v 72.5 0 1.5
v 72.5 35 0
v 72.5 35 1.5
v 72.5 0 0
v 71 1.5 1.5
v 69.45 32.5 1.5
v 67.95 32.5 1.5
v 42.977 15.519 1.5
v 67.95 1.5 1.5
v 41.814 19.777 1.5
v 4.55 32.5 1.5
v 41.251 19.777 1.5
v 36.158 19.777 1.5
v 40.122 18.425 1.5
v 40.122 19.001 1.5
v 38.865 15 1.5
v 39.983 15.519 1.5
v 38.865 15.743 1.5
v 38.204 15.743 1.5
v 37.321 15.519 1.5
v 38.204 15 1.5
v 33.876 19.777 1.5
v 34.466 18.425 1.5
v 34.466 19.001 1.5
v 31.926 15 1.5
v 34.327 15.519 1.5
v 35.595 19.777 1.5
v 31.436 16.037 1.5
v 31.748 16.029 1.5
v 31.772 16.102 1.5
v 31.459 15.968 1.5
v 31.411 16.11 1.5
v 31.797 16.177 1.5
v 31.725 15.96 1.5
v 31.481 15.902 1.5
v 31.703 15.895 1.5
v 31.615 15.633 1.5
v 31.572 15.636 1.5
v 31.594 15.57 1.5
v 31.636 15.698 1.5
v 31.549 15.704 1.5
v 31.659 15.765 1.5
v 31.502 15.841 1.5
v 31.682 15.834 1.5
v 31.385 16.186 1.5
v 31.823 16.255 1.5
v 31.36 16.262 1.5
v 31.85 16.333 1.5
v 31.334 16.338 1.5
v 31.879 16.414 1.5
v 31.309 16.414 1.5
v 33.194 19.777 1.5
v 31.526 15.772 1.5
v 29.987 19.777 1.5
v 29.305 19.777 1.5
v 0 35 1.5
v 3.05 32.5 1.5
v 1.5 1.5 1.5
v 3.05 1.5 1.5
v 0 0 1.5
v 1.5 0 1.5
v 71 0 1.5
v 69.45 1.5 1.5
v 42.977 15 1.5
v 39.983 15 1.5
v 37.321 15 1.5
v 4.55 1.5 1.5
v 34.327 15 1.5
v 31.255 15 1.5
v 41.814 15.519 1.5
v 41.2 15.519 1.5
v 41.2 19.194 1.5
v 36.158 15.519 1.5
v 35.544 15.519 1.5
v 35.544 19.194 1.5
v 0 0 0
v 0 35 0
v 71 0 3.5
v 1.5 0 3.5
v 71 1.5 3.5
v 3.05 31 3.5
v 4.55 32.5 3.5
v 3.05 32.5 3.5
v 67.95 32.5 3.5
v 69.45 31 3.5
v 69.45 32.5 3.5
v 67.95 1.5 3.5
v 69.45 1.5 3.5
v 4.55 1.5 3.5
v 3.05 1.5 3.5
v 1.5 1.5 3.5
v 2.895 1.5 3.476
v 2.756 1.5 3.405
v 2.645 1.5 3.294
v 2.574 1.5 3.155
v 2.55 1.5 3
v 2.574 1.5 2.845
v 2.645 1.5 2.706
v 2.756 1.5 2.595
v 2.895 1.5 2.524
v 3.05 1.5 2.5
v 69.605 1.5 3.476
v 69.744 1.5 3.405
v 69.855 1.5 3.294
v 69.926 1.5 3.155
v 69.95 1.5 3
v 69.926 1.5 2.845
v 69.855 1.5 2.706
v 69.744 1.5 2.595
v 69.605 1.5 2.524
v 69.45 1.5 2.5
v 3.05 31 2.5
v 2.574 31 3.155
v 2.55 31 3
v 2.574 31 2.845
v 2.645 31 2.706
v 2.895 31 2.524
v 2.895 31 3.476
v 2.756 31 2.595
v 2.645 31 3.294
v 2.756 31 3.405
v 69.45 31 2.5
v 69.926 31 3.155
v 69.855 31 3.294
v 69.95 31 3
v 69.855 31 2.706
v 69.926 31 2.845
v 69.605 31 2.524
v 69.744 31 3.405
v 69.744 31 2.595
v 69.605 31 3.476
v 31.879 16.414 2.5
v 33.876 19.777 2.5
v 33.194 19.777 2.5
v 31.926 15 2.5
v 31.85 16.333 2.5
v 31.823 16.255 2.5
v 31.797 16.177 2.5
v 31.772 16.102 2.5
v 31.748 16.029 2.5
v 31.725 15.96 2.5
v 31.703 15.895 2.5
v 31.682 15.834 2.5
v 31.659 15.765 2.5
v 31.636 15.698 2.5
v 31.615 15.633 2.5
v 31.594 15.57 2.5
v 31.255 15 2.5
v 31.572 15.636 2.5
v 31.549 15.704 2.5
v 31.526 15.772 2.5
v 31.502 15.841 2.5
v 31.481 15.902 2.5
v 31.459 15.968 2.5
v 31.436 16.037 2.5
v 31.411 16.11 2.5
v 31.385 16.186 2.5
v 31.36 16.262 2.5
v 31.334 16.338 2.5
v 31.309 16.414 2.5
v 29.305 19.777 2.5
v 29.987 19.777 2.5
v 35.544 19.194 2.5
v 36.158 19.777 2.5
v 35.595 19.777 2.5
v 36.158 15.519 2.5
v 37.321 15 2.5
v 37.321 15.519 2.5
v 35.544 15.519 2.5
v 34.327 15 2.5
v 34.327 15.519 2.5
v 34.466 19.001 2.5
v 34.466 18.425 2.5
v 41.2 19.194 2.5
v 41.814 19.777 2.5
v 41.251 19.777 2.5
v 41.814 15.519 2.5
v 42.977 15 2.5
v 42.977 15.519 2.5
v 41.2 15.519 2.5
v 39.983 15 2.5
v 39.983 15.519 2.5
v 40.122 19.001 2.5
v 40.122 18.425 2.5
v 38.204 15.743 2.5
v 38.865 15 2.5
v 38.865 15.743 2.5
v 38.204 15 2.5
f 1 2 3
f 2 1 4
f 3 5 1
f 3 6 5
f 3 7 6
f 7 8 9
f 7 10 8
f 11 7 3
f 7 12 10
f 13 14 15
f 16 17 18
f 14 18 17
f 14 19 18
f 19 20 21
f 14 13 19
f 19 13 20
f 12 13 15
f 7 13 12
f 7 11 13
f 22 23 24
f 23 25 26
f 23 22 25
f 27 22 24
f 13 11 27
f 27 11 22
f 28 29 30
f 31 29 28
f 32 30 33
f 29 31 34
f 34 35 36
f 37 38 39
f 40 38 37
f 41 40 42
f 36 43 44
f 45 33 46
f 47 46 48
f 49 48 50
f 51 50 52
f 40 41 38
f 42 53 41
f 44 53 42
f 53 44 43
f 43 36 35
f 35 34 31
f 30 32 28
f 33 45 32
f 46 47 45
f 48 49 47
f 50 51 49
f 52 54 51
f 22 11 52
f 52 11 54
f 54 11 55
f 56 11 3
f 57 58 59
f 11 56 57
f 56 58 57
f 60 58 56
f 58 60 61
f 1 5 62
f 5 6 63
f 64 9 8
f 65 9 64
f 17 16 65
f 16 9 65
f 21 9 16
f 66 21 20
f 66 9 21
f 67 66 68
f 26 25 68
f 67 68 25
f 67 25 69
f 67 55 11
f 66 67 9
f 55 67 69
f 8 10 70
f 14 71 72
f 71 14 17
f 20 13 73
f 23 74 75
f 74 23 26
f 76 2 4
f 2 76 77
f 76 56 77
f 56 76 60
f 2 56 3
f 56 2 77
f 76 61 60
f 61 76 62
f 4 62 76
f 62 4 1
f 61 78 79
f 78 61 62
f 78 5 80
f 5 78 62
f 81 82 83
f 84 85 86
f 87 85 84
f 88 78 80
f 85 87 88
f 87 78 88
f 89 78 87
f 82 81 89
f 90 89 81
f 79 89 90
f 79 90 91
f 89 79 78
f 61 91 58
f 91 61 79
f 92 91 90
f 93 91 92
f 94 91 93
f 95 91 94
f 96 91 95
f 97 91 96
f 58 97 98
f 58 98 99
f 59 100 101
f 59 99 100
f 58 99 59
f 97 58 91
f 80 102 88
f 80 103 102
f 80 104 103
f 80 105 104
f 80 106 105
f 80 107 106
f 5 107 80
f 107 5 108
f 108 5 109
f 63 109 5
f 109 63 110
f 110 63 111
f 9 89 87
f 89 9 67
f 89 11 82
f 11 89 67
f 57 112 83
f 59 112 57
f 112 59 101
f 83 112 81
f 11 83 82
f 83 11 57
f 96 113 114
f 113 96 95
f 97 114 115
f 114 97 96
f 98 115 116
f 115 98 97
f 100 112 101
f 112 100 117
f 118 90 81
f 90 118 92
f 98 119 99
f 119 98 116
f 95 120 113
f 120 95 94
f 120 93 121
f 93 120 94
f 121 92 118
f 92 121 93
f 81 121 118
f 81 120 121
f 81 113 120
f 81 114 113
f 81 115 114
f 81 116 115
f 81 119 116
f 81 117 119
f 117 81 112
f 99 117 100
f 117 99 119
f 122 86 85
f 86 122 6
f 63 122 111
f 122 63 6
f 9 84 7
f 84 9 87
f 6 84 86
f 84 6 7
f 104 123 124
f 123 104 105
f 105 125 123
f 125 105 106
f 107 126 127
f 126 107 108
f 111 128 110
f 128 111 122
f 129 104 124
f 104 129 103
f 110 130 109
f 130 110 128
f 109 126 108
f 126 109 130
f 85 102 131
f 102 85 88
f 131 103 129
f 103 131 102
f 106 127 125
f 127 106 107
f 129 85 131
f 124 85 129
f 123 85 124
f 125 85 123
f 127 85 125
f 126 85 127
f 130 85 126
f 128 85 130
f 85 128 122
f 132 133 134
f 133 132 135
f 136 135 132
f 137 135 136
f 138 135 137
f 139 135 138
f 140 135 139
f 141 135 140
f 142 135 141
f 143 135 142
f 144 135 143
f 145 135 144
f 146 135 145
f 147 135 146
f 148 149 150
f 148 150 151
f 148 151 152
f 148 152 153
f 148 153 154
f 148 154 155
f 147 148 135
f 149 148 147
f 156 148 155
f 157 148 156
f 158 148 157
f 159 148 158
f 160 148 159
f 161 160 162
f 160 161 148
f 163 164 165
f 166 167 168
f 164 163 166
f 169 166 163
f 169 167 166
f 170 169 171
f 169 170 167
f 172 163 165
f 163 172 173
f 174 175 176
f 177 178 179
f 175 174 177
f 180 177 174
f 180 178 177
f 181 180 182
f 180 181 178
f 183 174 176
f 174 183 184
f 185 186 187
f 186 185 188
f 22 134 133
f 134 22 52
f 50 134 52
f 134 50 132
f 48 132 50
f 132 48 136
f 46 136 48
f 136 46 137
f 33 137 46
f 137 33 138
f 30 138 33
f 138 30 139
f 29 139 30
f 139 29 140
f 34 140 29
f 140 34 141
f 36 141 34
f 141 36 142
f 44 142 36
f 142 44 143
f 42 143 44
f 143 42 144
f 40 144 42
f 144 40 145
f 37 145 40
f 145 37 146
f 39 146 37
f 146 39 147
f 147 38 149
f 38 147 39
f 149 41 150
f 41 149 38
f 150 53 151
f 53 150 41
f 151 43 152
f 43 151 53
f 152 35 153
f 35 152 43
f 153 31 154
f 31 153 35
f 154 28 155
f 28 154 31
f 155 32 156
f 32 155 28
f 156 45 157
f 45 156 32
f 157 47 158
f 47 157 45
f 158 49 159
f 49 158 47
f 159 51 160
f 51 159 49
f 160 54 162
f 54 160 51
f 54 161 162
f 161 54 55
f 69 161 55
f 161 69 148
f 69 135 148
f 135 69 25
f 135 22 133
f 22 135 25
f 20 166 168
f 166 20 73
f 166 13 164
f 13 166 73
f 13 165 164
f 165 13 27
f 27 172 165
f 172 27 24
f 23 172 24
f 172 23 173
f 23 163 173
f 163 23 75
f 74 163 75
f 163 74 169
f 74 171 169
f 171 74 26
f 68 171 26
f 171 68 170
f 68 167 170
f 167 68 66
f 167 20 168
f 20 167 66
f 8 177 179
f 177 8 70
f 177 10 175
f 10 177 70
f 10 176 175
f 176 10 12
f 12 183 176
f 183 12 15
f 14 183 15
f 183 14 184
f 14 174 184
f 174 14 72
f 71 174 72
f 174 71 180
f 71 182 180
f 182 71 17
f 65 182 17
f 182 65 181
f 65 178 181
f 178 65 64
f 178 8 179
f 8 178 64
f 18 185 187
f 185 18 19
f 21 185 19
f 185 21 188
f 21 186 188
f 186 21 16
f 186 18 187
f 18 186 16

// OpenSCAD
//
//	Gerause für REM-C  / Din rail
//
//  by Rainer Petzoldt
//  basiert auf REM-M-Geh.scad V0.3.7
//  Slicen ohne Stützstruktur ;  4 Wandlinien ;  3 Obere- und untere Schichten
//     generateStuetzstruktur = true setzen

/* width in TE (=18mm) */
AnzTE = 4;   // [1:0.5:12]
/* select which part to show */
part = "Deckel" ; // [Unterteil, Oberteil, Deckel, Oberteil_mit_Deckel, Schnapper, all, assembled]
showPlatinen = false;
generateStuetzstruktur = true;

// *******************************************************************

/* [Hidden] */
deckelLift = 1*5;   // zieht module auseinander (Explosionszeichnung)
h1debug =  0*19;   // 0 = no debug  erniedrigt aussenwand um h1debug mm
Vers =  "V1.1";
TE = 18;	// Teilungseinheit
d = 1.5;   				// Wanddicke

breite = AnzTE * TE-0.5+1;  // Gesamtbreite aussen
tiefe = 91;				// Tiefe unterste Ebene
tiefe2 = 62-12;			// Tiefe mittlere Ebene
tiefe3 = 45-10;			// Tiefe mittlere Ebene

deltaH = 0*12;
h1 = 26.5+deltaH;				// Hoehe Unterteil gesamt aussen
h2 = 5;           // Aussparung fuer Schiene 
h3 = 5;         // Hoehe unterste Deckelschicht
h4 = 17-deltaH;          // Hoehe mittlere Deckelschicht
h5 = 22-10;          // Hoehe obere Deckelschicht
b1 = 28-2.5;
b2 = 0.5;
b3 = 35;
b4 = 28;
spalt = 0.4;

mitteY = tiefe / 2;
mitteX = breite/2;

RemMMy = 42;
RemMMx = 33;
RemMMAbstandy = 0;

F5 = 0.001;


difference()
{
	union()
	{
if (part=="assembled")
{
		Unterteil(breite);
		translate([0,0,h1+deckelLift])	Oberteil(breite);
		translate([0,(tiefe+tiefe3)/2,h1+h3+h4+h5+2*deckelLift])rotate([180,0,0])Deckel(breite);
		color("red") translate([breite/2-14/2,b1+1.5,5]) rotate([-90,0,-90])Schienenhalter();
		if (showPlatinen==true)
		{	
			translate([d-31.5+1,d-100+0.5,9])	color("White") 	rotate([0,0,90])	import("REM-C-mit_Sockel_u_Stecker.stl",convexity=5);
		}
}
else
{
	if (part=="Unterteil")
	{
		Unterteil(breite);
		if (showPlatinen==true)
		{	
			translate([d-31.5+1,d-100+0.5,9])	color("White") 	rotate([0,0,90])	import("REM-C-mit_Sockel_u_Stecker.stl",convexity=5);
		}

	}
	if (part=="Oberteil")
	{
		Oberteil(breite);
		if (showPlatinen==true)
		{	
			translate([d-31.5+1,d-100+0.5,9-h1])	color("White") 	rotate([0,0,90])	import("REM-C-mit_Sockel_u_Stecker.stl",convexity=5);
		}
	}
	if (part=="Oberteil_mit_Deckel")
	{
		color("red")translate([0,(tiefe+tiefe3)/2+F5,h3+h4+h5+deckelLift])rotate([180,0,0])Deckel(breite);
		Oberteil(breite);
		if (showPlatinen==true)
		{	
			translate([d-31.5+1,d-100+0.5,9-h1])	color("White") 	rotate([0,0,90])	import("REM-C-mit_Sockel_u_Stecker.stl",convexity=5);
		}
	}
	if (part=="Deckel")
	{
			Deckel(breite);
	}
	if (part=="Schnapper")	rotate([-90,0,0])Schienenhalter();
	if (part=="all")
	{
		Unterteil(breite);
		translate([breite+10,0,5]) Oberteil(breite);
		translate([2*breite+20,0,0])Deckel(breite);
    translate([2*breite+20,50,3])rotate([-90,0,0])Schienenhalter();
		
		if (showPlatinen==true)
		{	
			translate([d-31.5+1,d-100+0.5,9])	color("White") 	rotate([0,0,90])	import("REM-C-mit_Sockel_u_Stecker.stl",convexity=5);
			translate([d-31.5+1+breite+10,d-100+0.5,9-h1+5])	color("White") 	rotate([0,0,90])	import("REM-C-mit_Sockel_u_Stecker.stl",convexity=5);
		}
	}
}
}
	//translate([33,-25,-17])cube([100,200,100]);
}


module Deckel(breite)
{
	da = d + 0.5;
	cube([breite,tiefe3,d]);	 // Deckel
	translate([d,0,0])cube([breite-2*d,d,d+2]);	 // Seitenwand
  // rechtes
	dx = 0.1;
	translate([2*d +dx/2  ,d,0])cube([d,tiefe3-2*da,d+2]);	  // rechts
  translate([2*d +dx/2  ,tiefe3-2*da,3])rotate([90,0,0])cylinder(h=tiefe3-2*da,d=1,$fn=20); // rechts 
	// links
	translate([breite-3*d-dx/2,d,0])cube([d,tiefe3-2*da,d+2]);	
  translate([breite -2*d-dx/2 ,tiefe3-2*da,3])rotate([90,0,0])cylinder(h=tiefe3-2*da,d=1,$fn=20);

  translate([mitteX,15,1])scale(0.5)linear_extrude(height=3)text(Vers,halign="center");

}  

module Deckelschienen()
{
	dy = 32.5;
	translate([0,29+dy,32.5])
	rotate([90,0,0])
	linear_extrude(height=dy,convexity=2)
	polygon(points = [ [0,0], [2*d,0],[2*d,-3],[0,-8] ], convexity = 2);
}

module Unterteil(breite)
{
	difference()
	{
		//translate([-d-0.001,0,118])  // debugging
		cube([breite,tiefe,h1-h1debug]);																				// Aussenwand
		translate([d,d,h2+d+F5])cube([breite-2*d,tiefe-2*d,h1-d-h2]);		// Innenwand
    // Kabelzufuehrungen
		translate([61,75,7+h2+d+F5])cube([3,15.599,5]);		//  3.3V   mit einer Schicht verschlossen da optional
		translate([61+2*2.54,75,7+h2+d+F5])cube([3,15.599,5]);		// 3.3V mit einer Schicht verschlossen da optional
		for (i=[2*5.08:5.08:7*5.08])
		{
			translate([40.7-2*5.08+i,-5,7+h2+d+F5])cube([3,20,5]);		//  Spannungsanschluss
		}
		for (i=[0:5.08:1*5.08])
		{
			translate([40.7-2*5.08+i,0.401,7+h2+d+F5])cube([3,20,5]);		//  Spannungsanschluss Optional
		}
		for (i=[0:5.08:1*5.08])
		{
			translate([6.5+i,-5,7+h2+d+F5])cube([3,20,5]);		//  Spannungsanschluss
		}
		
		
		translate([35.5,75,22.5])cube([17,20,14]);		// Ausschnitt für RJ45
		translate([9.5,85,20.5])uUSB();		// Ausschnitt für USB
		
		translate([0,b1,0])Railausschnitt(breite+1);										// Schienenausschnitt
		translate([breite/2-14/2-spalt,0-F5,2-2*spalt-F5])cube([14+2*spalt,b1+2*d+F5,3+2*spalt]);		// Schnapperausschnitt
  	translate([breite/2-3.5,10,0])		cylinder(h=8,d=3.0,$fn=20);   // Loch fuer Schnapperverankerung
		wa = 3;  // Wanddicke Aussparungen
		translate([breite/2-10/2,0-F5,d-4.9+2*F5])cube([10,13,h2]);		      // Wartungsoeffnung
		translate([wa,wa,-F5])cube([(breite-14)/2-2*wa,b1-2*wa,h2]);	    // Materialsparen unten1
		translate([(breite+14)/2+wa,wa,-F5])cube([(breite-14)/2-2*wa,b1-2*wa,h2]);	    // Materialsparen unten2
		translate([wa,tiefe-b4+wa,-F5])cube([breite-2*wa,b1-2*wa,h2]);		// Materialsparen unten3
		translate([(breite-14)/2+1.5,0,1.6+d])rotate([60,0,0])translate([0,0,-3])cube([4,3,7]);		// Rampe fuer Schnappernase
		translate([(breite-14)/2+5.5-F5,-1,1.6+d])rotate([20,0,0])translate([0,0,-0])cube([4,3,7]);		// Rampe fuer Schraubendreher
		// Schnapperaussparungen
		Schnapperaussparungen(10,h1-26.5+22);
		
	}
	  // Logo und Version
    translate([mitteX,tiefe-12,h2+d-0.4])scale(0.5)RPLogo();
 	  translate([mitteX,tiefe-27,h2+d-0.8])scale(0.5)linear_extrude(height=3)text(Vers,halign="center");

	// Platinenhalterungen
	phx = (RemMMx)/2 + 6;// breite/2 - d -2.25-0.5;	// Mittenabstand Platinenhalter x
	phy = tiefe/2-d-2-8;
	phy2 = RemMMAbstandy/2+2.6;


	echo("Unterteilloecher:", 2phx=2*phx, 2phy=2*phy, 2phy2=2*phy2, dpy=phy-phy2);
	// Abstandsbolzen
	//Bolzenpositionen festlegen
	translate([mitteX+phx,mitteY+phy,0]) Platinenhalter(2,0);
	translate([mitteX-phx,mitteY+phy,0]) Platinenhalter(2,0);
	translate([mitteX+phx,mitteY-phy,0]) Platinenhalter(2,0);
	translate([mitteX-phx,mitteY-phy,0]) Platinenhalter(2,0);
	// Schraublochbolzen
	translate([6.5,25,0]) Platinenhalter(5);
	translate([66.5,58,0]) Platinenhalter(5);
	// Haltekante nach oben
	hky = 3.75;
	
	if ( generateStuetzstruktur)
	{ 
		di = 0.41;
		color("blue")
		{	// Fuer Schnapperlement
			hull()
			{
				translate([29,0,4-0.21])cube([12,13,1]);	
				translate([33,1,0])cube([8,9,1]);	
			}
		// Fuer Bodenhohlräümen	
		translate([4,9,-0.10])cube([21,di,5-0.21]);		// z -0.1 wegen bug in Cura
		translate([4,15,0])cube([21,di,5-0.21]);		
		translate([14,4,0])cube([di,17,5-0.21]);		// quer

		translate([47,9,0])cube([21,di,5-0.21]);		
		translate([47,15,0])cube([21,di,5-0.21]);		
		translate([57,4,0])cube([di,17,5-0.21]);		// quer

		translate([28,26,0])cube([16,di,5-0.21]);		
		translate([0,36,0])cube([breite,di,5-0.21]);		
		translate([0,47,0])cube([breite,di,5-0.21]);		
		translate([breite/4,27,0])cube([di,29,5-0.21]);		// quer
		translate([2*breite/4,26,0])cube([di,29,5-0.21]);		// quer
		translate([3*breite/4,27,0])cube([di,29,5-0.21]);		// quer

		translate([4,70,0])cube([breite-8,di,5-0.21]);		
		translate([4,80,0])cube([breite-8,di,5-0.21]);		
		translate([breite/4,67,0])cube([di,18,5-0.21]);		// quer
		translate([2*breite/4,67,0])cube([di,18,5-0.21]);		// quer
		translate([3*breite/4,67,0])cube([di,18,5-0.21]);		// quer
		}
	}
}


module Schnapperaussparungen(schnapperbreite,h=22)
{
		at = 2;  	// tiefe Aussparung
		ah = 2;   	// Hoehe Aussparung
		ab = schnapperbreite;  		// Breite Aussparung
		//h = 22;	// Position Z
	  yd = 10;
	  y1 =  mitteY - yd;
    y2 =  mitteY + yd;

		translate([       0,y1  , h]) rotate([0,0,-90]) Schnapperaussparung(ab,at,ah);
		translate([  breite,y1, h]) rotate([0,0, 90]) Schnapperaussparung(ab,at,ah);
		translate([       0,y2  , h]) rotate([0,0,-90]) Schnapperaussparung(ab,at,ah);
		translate([  breite,y2, h]) rotate([0,0, 90]) Schnapperaussparung(ab,at,ah);
}

module Schnapperaussparung(ab,at,ah)
{
	translate([-ab/2,-F5,0])cube([ab,at,ah]);
	translate([-ab/2,1,1])cube([ab,at,5]);
}

module Railausschnitt(breite)
{
	difference()
	{
		
		translate([breite+0.5,0,h2-F5])		rotate([-90,0,90])
		linear_extrude(height=breite+1,convexity=2)
		{
			polygon(points=[[b2,0],[0,h2],[b2+b3,h2],[b2+b3,0]]);
		}
		
		translate([-0.5,b2+b3-2.5,3.5])rotate([0,90,0])
	
	  hull()
		{
        translate([1.8,0,0]) cylinder(h=breite+1, r=1, $fs=0.1, center=false);
        translate([0,1.8,0]) cube([2.8,1,breite+1], center=false);
        translate([3,0,0]) cube([1,3,breite+1], center=false);
    }
	}
}

module Schienenhalter()
{
	
	l1 = 30.4;
	l2 = 1.2;
	l3 = l1 + l2;
	h1 = 1.2;
	h2 = 1.8;
	h3 = h1 + h2;
	ba = 14;

	difference()
	{
		// Grundform
		linear_extrude(height=ba,convexity=2)
		{
			polygon(points=[[-0.5,h1],[l2,h3],[l3,h3],[l3,0],[l2,0],[l2,h1]]);
		}
		// Federelement
    translate([14,h3+F5,2])
		rotate([90,0,0])
		linear_extrude(height=h3+2*F5,convexity=2)
		{
			ha = 10.5;
			bx = 8;
			v = 1;
			polygon(points=[
			[0,0],[0,ha],[3-v,ha],[3,ha-v],[3,1.5],[5,1.5],[5,ha-v],[5+v,ha],
			[bx,ha],[bx,0]
			]);
		}
		translate([16,-2,3.5])cube([4,h3,9]);			        // Feder duenner machen
		translate([l3-3-2,0-F5,3])cube([3,h3+2*F5,8]);			// Aussparung zum oeffnen mit Schraubendreher
	}
	translate([18,h3,3.5])	rotate([90,0,0])	cylinder(h=h3+d,d=2,$fn=20);	// Arretierung
}

module Platinenhalter(durchmesser=4, loch=2)
{
	translate([0,0,h2+d])
	difference()
	{
		cylinder(h=2.5,d1=durchmesser+3,d2=durchmesser,$fn=20);
		translate([0,0,-F5])cylinder(h=2.6,d=loch,$fn=20);
	}
}




module uUSB()
{
	rad = 1;
	rad2 = 1.5;
	fn = 20;
	h = 8;
	dx = 1.;
	
	//translate([0,-1.5,0])cube([10,7,5]);
	hull()
	rotate([-90,0,0])
	{
		translate([dx+rad,-rad,0]) cylinder(h=h,r=rad,$fn=fn);
		translate([10-dx-rad,-rad,0]) cylinder(h=h,r=rad,$fn=fn);
		translate([rad2,rad2-5,0]) cylinder(h=h,r=rad2,$fn=fn);
		translate([10-rad2,-5+rad2,0]) cylinder(h=h,r=rad2,$fn=fn);
	
	}
	
}


module Oberteil(breite)
{
	difference()
	{
		union()
		{
			cube([breite,tiefe,h3]);																				// Aussenwand unten
			translate([0,(tiefe-tiefe2)/2,h3]) cube([breite,tiefe2,h4]);		// Aussenwand mitte
			translate([0,(tiefe-tiefe3)/2,h3+h4]) cube([breite,tiefe3,h5-d]);		// Aussenwand oben
			translate([30.5,70,h3]) cube([27,21,12]);		// RJ45 Auswoelbung
			// Beschriftungen
				translate([11,       11.5+F5,h3])	scale(0.5)linear_extrude(height=0.6/0.3,convexity=2)text(text="5V",halign="center",font="Arial:style=Bold");
				translate([10,       0.5+F5,h3])	scale(0.5)linear_extrude(height=0.6/0.3,convexity=2)text(text="+  -",halign="center",font="Arial:style=Bold");
				translate([32.95,       11.5+F5,h3])	scale(0.5)linear_extrude(height=0.6/0.3,convexity=2)text(text="U  L1 L2 L3",font="Arial:style=Bold");
				translate([65,       75+F5,h3])	scale(0.5)linear_extrude(height=0.6/0.3,convexity=2)text(text="3.3V",halign="center",font="Arial:style=Bold");
				translate([65,       86.5+F5,h3])	scale(0.5)linear_extrude(height=0.6/0.3,convexity=2)text(text="+  -",halign="center",font="Arial:style=Bold");
			
/*
			// Lochbeschriftung
			for(i=[0:AnzTE*3-0.1])
			{
				start = breite/2-(AnzTE*3-1)*5.08/2-0.75;
				num = i+1;
				translate([start+i*5.08,       11.5+F5,h3])	scale(0.5)linear_extrude(height=0.6/0.3,convexity=2)text(text=str(num),halign="center",font="Arial:style=Bold");
				translate([start+i*5.08, tiefe-16.2+F5,h3])	scale(0.5)linear_extrude(height=0.6/0.3,convexity=2)text(str(6-i),halign="center",font="Arial:style=Bold");
			}
			*/
			translate([mitteX,       64+F5,h3+h4])	scale(0.5)linear_extrude(height=0.6/0.3,convexity=2)text(text="REM-C",halign="center",font="Arial:style=Bold");
			translate([mitteX,       22+F5,h3+h4])	scale(0.5)linear_extrude(height=0.6/0.3,convexity=2)text(text=Vers,halign="center",font="Arial:style=Bold");
			
		}
		translate([d,d,0-F5])cube([breite-2*d,tiefe-2*d,h3-d]);		// Innenwand  unten
		translate([d,d+(tiefe-tiefe2)/2,h3-d-2*F5]) cube([breite-2*d,tiefe2-2*d,h4+F5]);		// Innenwand mitte
		translate([d,d+(tiefe-tiefe3)/2,h3+h4-d-2*F5]) cube([breite-2*d,tiefe3-2*d,h5+F5+3]);		// Innenwand oben
		translate([-10,14+d+(tiefe-tiefe3)/2,9+h3+h4-d-2*F5]) cube([100,13.5,10]);		// Kabelausschnitte
		translate([d,d+(tiefe-tiefe3)/2,h3+h4-d+9.8+F5]) cube([breite-2*d,tiefe3-d+F5,h5+F5+3]);		 // Wand weg
		translate([35.5,65,0-F5])cube([17,30,11]);		// Ausschnitt für RJ45
		
		// Schraubenloecher
		durchm = 4;
		for(i=[0:7])
		{
			start = 31.9;
			translate([start+i*5.08,           7.4+F5,h3-d-2*F5-15])	cylinder(h=20+d+3*F5,d=durchm,$fn=20);
		}
		for(i=[0:1])
		{
			start = 7.9;
			translate([start+i*5.08,           7.4+F5,h3-d-2*F5-15])	cylinder(h=20+d+3*F5,d=durchm,$fn=20);
			translate([start+i*5.08+54.5,           84.3+F5,h3-d-2*F5-15])	cylinder(h=20+d+3*F5,d=durchm,$fn=20);
		}

	}
  // RJ45 obere Wand
	translate([35.5,89.5,9.5])cube([17,d,1.5]);		// Ausschnitt für RJ45
	// Optionale  Schraubenloecher schliessen
	translate([29,5,4.5])cube([10,5,0.21]);
	translate([60,82,4.5])cube([10,5,0.21]);

	difference()
	{
		union()
		{
			Deckelschienen();
			translate([72.5,90.5,0])rotate([0,0,180])Deckelschienen();
		}
	  translate([breite -2*d,2*tiefe3-7+F5,31])rotate([90,0,0])cylinder(h=tiefe3-d,d=1.5,$fn=20);  // Schnapperrillen
	  translate([2*d        ,2*tiefe3-7+F5,31])rotate([90,0,0])cylinder(h=tiefe3-d,d=1.5,$fn=20);       // Schnapperrillen
		translate([-10,14+d+(tiefe-tiefe3)/2,9+h3+h4-d-2*F5]) cube([100,13.5,10]);		// Kabelausschnitte
	}
	  // Logo und Version
    translate([mitteX-20,mitteY+tiefe2/2-0.4,18])rotate([90,0,180])scale(0.5)RPLogo();
 	  translate([mitteX-20,mitteY+tiefe2/2-0.4,h2+d-0.4])rotate([90,0,180])scale(0.3)linear_extrude(height=3)text(Vers,halign="center",font="Arial:style=Bold");
	
	// Schnapper
  AlleSchnapper(10);
	
	h = h3+h4+5;
	phx = (RemMMx) - 2.5;// breite/2 - d -2.25-0.5;	// Mittenabstand Platinenhalter x
	phy = tiefe2/2-3.5-d;

	echo("Deckelloecher:", 2phx=2*phx, 2phy=2*phy);
	// Platinenhalterungen
	translate([mitteX+phx-0.5,mitteY+phy,h]) rotate([180,0,0])Platinenhalter(5);
	translate([mitteX-phx+0.5,mitteY+phy,h]) rotate([180,0,0])Platinenhalter(5);
	translate([mitteX+phx-0.5,mitteY-phy,h]) rotate([180,0,0])Platinenhalter(5);
	translate([mitteX-phx+0.5,mitteY-phy,h]) rotate([180,0,0])Platinenhalter(5);
	
	if ( generateStuetzstruktur)
	{ 
		di = d;
		color("blue")
		{	
			// Unterer Rand
			hu = 4.75;
			schnapperBreite = 11;
			stbre = .41;
  
			translate([0,0,-hu])cube([breite,di,hu-0.21]);		
  		translate([0,tiefe-d,-hu])cube([breite,di,hu-0.21]);
			translate([0,tiefe-d,-hu])cube([3,di,hu]);  // Ecke ohne Spalt
			translate([breite-3,tiefe-d,-hu])cube([3,di,hu]);  // Ecke ohne Spalt
			translate([0,0,-hu])cube([3,di,hu]);  // Ecke ohne Spalt
			translate([breite-3,0,-hu])cube([3,di,hu]);  // Ecke ohne Spalt
			
			difference()
			{
				translate([0,0,-hu])cube([di,tiefe,hu-0.21]);		
				translate([0,41,0])rotate([0,0,180])SchnapperStuetzAussaprung(schnapperBreite,di);
				translate([0,61,0])rotate([0,0,180])SchnapperStuetzAussaprung(schnapperBreite,di);
				
			}
  		difference()
			{
				translate([breite-d,0,-hu])cube([di,tiefe,hu-0.21]);	
				translate([breite,30,0])SchnapperStuetzAussaprung(schnapperBreite,di);
				translate([breite,50,0])SchnapperStuetzAussaprung(schnapperBreite,di);
			}
			
			// Schraubloecherstuetzen
			translate([6.2,25.5,-hu])cylinder(h=22.7-0.21,r=2.8);
			translate([breite-6.2,25.5,-hu])cylinder(h=22.7-0.21,r=2.8);
			translate([6.2,65.5,-hu])cylinder(h=22.7-0.21,r=2.8);
			translate([breite-6.2,65.5,-hu])cylinder(h=22.7-0.21,r=2.8);

			// Stuetzen für Flaechen
			translate([d+1,4,3.5-0.61-0.21])cube([breite-5,8.0,0.61]);	
		  translate([d+1,4,-hu-0.1])cube([breite-5,stbre,hu+3.5-0.21]);		// z um 0.1 kleiner wegen bug in cura
		  translate([d+1,12,-hu])cube([breite-5,stbre,hu+3.5-0.21]);		
		  translate([d+1,21.6,-hu])cube([breite-5,stbre,hu+3.5-0.21]);		
		  translate([d+8.5,22.3,-hu])cube([breite-22.5,stbre,hu+20.5-0.21]);		
		  translate([d+1,29.3,-hu])  cube([breite-5    ,stbre,hu+20.5-0.21]);		
			
			for (x=[2.5,10,20,30,40,50,60,70])  
			{
				translate([x,4,-hu])cube([stbre,25.7,hu+3.5-0.21]);		// quer
			}
			for (x=[10,20,30,40,50,60])  
			{
				translate([x,22.5,-hu])cube([stbre,7,hu+20.5-0.21]);		// quer
			}
			
      // 2. Haelfte
			// Stuetzen für Flaechen
			translate([59,80,3.5-0.61-0.21])cube([11,8.0,0.61]);	
		  translate([d+1,88,-hu])cube([breite-5,stbre,hu+3.5-0.21]);		
		  translate([d+1,80,-hu])cube([breite-5,stbre,hu+3.5-0.21]);		
		  translate([d+1,69,-hu])cube([breite-5,stbre,hu+3.5-0.21]);		
		  translate([d+8.5,68.3,-hu])cube([breite-22.5,stbre,hu+20.5-0.21]);		
		  translate([d+1,61.3,-hu])  cube([breite-5    ,stbre,hu+20.5-0.21]);		
			
			for (x=[2.5,10,20,30,40,50,60,70])  
			{
				translate([x,61.3,-hu])cube([stbre,27.1,hu+3.5-0.21]);		// quer
			}
			for (x=[10,20,30,40,50,60])  
			{
				translate([x,61.3,-hu])cube([stbre,7,hu+20.5-0.21]);		// quer
			}

			// RJ45 Stuetze
  		translate([36,tiefe-d,-1])cube([16,di,12-0.21-1.5]);
			translate([40,69,0])cube([stbre,20.5,11-0.21]);		// quer
			translate([47,69,0])cube([stbre,20.5,11-0.21]);		// quer
			
			
		}
	}

}

module SchnapperStuetzAussaprung(schnapperBreite,di)
{
			translate([-d-0.8,0,-7])cube([di,schnapperBreite,7]);		// z -0.01 wegen bug in Cura
			translate([-d+F5    ,0,-7])cube([di,schnapperBreite,5]);		// z -0.01 wegen bug in Cura
}

module AlleSchnapper(schnapperbreite)
{
		at = 2;  	// tiefe Aussparung
		ah = 2;   	// Hoehe Aussparung
		ab = schnapperbreite-1;  		// Breite Aussparung
		h = -4.75;	// Position Z
	  yd = 10;
	  y1 = mitteY - yd;
    y2 = mitteY + yd;

		translate([       0,y1  , h]) rotate([0,0,-90]) Schnapper(ab,at,ah);
		translate([  breite,y1, h]) rotate([0,0, 90]) Schnapper(ab,at,ah);
		translate([       0,y2  , h]) rotate([0,0,-90]) Schnapper(ab,at,ah);
		translate([  breite,y2, h]) rotate([0,0, 90]) Schnapper(ab,at,ah);
}

module Schnapper(ab,at,ah,ba=4)
{
	xa = 1;
	xb = d+1;
	ya = 2;
	yb = 8;
	//ba = 4;	// breite
	rotate([90,0,90]) translate([0,0,-ab/2])
	linear_extrude(height=ab,convexity=2)
	{
		polygon(points=[[xa,0],[0,ya],[xa,ya],[xa,yb],[xb-2,yb+2],[xb,yb-2],[xb,0]]);
	}
}

module RPLogo()
{
	h = 2;
  b = 10;		// Ellipsenbreite
  t = 6;		// Ellipsenhoehe
  l = 22;		// Strichlaenge
  fn = 40;
  d = 2;		// Liniendicke
	w = 40;
	l1 = (l - 2*t)/ cos(w) -d/2;
	difference()
	{
		scale([b,t,h])cylinder(r=1,h=1,$fn=fn);
		scale([b-d,t-d,h])cylinder(r=1,h=h,$fn=fn);
	}
	translate([0,t-l/2-0.1,h/2])cube([d,l,h],center=true);
	translate([d/2,-t,0])rotate([0,0,180-w])cube([d,l1,h]);

}
